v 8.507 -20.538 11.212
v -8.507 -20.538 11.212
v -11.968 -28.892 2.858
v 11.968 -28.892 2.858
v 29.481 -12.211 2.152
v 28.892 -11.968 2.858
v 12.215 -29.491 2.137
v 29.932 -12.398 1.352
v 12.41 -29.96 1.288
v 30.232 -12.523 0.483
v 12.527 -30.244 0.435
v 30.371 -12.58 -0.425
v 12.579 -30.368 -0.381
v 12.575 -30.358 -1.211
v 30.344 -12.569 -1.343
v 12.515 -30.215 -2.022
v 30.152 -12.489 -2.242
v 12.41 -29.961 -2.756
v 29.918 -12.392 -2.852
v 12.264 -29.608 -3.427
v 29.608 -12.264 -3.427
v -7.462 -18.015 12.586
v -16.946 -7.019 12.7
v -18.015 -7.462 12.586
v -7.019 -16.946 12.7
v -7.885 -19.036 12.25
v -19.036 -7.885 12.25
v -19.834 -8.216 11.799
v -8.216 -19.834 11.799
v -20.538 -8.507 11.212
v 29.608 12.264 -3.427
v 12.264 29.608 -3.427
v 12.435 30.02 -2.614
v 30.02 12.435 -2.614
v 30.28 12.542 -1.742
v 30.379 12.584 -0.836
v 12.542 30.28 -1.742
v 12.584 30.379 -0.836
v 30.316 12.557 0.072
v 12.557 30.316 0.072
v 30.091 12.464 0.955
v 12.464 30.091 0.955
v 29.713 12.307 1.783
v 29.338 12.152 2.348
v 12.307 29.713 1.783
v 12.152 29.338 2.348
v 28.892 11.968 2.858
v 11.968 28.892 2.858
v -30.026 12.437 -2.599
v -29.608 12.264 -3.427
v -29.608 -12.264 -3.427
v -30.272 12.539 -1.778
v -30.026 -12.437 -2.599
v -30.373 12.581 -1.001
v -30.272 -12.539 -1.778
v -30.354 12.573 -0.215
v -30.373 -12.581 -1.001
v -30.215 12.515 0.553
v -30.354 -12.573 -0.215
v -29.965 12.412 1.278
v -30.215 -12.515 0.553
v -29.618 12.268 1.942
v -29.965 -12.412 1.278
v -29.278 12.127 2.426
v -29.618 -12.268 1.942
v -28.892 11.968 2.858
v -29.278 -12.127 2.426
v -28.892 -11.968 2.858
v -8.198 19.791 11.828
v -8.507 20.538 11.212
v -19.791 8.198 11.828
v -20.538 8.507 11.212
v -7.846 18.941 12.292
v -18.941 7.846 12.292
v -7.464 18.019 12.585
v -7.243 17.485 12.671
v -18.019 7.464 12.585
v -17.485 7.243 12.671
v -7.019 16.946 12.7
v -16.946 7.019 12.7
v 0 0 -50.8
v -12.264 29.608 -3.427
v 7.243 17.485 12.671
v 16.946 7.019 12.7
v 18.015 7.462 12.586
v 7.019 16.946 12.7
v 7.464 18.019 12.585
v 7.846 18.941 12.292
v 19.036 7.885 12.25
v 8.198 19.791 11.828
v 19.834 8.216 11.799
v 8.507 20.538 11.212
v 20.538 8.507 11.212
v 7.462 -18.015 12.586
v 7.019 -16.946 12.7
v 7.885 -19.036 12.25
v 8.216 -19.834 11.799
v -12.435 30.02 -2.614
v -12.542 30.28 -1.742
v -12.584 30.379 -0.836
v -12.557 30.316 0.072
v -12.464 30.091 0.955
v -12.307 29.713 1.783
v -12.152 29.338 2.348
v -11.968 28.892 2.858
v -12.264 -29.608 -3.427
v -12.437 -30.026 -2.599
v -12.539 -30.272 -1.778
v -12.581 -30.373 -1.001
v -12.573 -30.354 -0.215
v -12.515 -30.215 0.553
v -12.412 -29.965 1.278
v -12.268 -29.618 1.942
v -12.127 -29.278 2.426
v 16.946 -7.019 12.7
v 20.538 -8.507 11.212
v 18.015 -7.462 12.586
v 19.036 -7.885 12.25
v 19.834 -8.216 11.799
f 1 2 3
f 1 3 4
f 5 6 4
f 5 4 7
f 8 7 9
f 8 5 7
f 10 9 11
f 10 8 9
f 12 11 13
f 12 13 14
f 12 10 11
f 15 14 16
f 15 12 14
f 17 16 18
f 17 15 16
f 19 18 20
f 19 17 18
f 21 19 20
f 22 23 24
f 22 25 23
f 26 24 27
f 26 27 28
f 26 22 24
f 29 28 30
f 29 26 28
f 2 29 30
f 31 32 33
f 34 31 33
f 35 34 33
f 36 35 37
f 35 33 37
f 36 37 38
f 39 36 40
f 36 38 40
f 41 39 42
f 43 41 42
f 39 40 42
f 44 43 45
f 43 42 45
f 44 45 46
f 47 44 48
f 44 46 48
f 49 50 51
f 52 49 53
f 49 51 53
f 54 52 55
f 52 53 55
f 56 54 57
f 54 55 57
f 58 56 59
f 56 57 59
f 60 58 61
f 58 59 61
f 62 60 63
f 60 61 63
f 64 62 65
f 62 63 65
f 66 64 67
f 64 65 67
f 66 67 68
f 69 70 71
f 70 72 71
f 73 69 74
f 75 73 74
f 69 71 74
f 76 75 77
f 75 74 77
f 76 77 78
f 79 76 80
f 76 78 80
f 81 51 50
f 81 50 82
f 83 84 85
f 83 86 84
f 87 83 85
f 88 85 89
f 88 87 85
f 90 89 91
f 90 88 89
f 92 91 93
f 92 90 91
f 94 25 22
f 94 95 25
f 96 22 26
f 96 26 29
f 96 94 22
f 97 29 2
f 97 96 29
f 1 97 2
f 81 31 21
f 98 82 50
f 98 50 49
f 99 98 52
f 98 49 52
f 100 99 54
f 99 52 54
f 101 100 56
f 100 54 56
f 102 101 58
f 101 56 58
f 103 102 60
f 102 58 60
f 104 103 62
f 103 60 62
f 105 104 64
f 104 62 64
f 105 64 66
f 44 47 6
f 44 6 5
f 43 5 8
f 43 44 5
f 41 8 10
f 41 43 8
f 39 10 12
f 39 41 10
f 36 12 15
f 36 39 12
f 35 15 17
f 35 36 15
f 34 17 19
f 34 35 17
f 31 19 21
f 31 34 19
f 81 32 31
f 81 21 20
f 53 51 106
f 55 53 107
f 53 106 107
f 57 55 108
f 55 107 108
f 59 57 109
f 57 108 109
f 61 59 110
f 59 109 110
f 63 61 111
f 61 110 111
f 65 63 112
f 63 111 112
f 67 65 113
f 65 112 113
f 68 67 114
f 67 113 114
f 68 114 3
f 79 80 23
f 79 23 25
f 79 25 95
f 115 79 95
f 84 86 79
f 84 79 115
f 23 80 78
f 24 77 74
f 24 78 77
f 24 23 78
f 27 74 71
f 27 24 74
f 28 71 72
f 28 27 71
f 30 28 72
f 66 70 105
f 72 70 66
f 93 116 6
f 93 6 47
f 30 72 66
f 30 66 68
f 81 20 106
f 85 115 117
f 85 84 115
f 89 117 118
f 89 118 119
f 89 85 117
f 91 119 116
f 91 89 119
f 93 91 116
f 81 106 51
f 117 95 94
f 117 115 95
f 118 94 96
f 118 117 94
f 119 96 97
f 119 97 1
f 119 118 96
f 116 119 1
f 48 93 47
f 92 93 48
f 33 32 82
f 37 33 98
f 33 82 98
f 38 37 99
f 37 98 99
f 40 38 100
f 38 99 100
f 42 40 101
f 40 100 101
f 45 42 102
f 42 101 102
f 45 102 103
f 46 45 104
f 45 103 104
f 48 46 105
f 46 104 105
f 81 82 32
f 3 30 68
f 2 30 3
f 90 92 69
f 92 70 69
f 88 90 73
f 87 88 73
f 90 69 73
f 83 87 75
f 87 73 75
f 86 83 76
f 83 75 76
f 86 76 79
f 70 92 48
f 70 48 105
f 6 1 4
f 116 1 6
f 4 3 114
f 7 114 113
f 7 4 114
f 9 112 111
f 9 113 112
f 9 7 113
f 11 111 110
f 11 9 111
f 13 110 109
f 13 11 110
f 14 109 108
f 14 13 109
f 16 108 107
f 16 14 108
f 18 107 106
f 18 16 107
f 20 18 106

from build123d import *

# Parameters (mm, degrees)
F1_DEPTH = 12.7
F2_SIZE2 = 12.69999
F2_SIZE  = 12.69999
F6_R     = 5.08


# Not quite as in the source:
# - a fillet or chamfer is up to 0.001 mm smaller than in the source, because OpenCascade refuses the exact size


with BuildPart() as f1:
    # F0 (on Top) → F1 (new body)
    with BuildSketch(Plane.XY):
        Polygon((-31.75, 13.1512806053), (-31.75, -13.1512806053), (-13.1512806053, -31.75), (13.1512806053, -31.75), (31.75, -13.1512806053), (31.75, 13.1512806053), (13.1512806053, 31.75), (-13.1512806053, 31.75), align=None)
    extrude(amount=F1_DEPTH)

    # F2 (size 12.7 and 12.7 in the source; OpenCascade refuses exactly that, so slightly less here)
    f2_edges = [f1.edges().sort_by_distance(p)[0] for p in [
        (-22.45064, 22.45064, 12.7),
        (-31.75, 0, 12.7),
        (-22.45064, -22.45064, 12.7),
        (0, -31.75, 12.7),
        (22.45064, -22.45064, 12.7),
        (31.75, 0, 12.7),
        (22.45064, 22.45064, 12.7),
        (0, 31.75, 12.7),
    ]]
    chamfer(f2_edges, length=F2_SIZE, length2=F2_SIZE2)

    # F1_face (on face) → F5 section 0
    with BuildSketch(Plane(origin=(0, 0, 0), x_dir=(1, 0, 0), z_dir=(0, 0, -1)), mode=Mode.PRIVATE) as f5_s0:
        Polygon((-31.75, -13.1512806053), (-13.1512806053, -31.75), (13.1512806053, -31.75), (31.75, -13.1512806053), (31.75, 13.1512806053), (13.1512806053, 31.75), (-13.1512806053, 31.75), (-31.75, 13.1512806053), align=None)
    loft([f5_s0.sketch, Vertex(0, 0, -50.8)])

    # F6
    f6_edges = [f1.edges().sort_by_distance(p)[0] for p in [
        (-13.470391, 13.470391, 12.7),
        (0, 19.05001, 12.7),
        (-19.05001, 0, 12.7),
        (13.470391, 13.470391, 12.7),
        (-13.470391, -13.470391, 12.7),
        (19.05001, 0, 12.7),
        (0, -19.05001, 12.7),
        (13.470391, -13.470391, 12.7),
        (-22.45064, 22.45064, 1e-05),
        (0, 31.75, 1e-05),
        (-31.75, 0, 0),
        (22.45064, 22.45064, 0),
        (-22.45064, -22.45064, 0),
        (31.75, 0, 0),
        (0, -31.75, 0),
        (22.45064, -22.45064, 0),
    ]]
    fillet(f6_edges, radius=F6_R)


solid = f1.part
